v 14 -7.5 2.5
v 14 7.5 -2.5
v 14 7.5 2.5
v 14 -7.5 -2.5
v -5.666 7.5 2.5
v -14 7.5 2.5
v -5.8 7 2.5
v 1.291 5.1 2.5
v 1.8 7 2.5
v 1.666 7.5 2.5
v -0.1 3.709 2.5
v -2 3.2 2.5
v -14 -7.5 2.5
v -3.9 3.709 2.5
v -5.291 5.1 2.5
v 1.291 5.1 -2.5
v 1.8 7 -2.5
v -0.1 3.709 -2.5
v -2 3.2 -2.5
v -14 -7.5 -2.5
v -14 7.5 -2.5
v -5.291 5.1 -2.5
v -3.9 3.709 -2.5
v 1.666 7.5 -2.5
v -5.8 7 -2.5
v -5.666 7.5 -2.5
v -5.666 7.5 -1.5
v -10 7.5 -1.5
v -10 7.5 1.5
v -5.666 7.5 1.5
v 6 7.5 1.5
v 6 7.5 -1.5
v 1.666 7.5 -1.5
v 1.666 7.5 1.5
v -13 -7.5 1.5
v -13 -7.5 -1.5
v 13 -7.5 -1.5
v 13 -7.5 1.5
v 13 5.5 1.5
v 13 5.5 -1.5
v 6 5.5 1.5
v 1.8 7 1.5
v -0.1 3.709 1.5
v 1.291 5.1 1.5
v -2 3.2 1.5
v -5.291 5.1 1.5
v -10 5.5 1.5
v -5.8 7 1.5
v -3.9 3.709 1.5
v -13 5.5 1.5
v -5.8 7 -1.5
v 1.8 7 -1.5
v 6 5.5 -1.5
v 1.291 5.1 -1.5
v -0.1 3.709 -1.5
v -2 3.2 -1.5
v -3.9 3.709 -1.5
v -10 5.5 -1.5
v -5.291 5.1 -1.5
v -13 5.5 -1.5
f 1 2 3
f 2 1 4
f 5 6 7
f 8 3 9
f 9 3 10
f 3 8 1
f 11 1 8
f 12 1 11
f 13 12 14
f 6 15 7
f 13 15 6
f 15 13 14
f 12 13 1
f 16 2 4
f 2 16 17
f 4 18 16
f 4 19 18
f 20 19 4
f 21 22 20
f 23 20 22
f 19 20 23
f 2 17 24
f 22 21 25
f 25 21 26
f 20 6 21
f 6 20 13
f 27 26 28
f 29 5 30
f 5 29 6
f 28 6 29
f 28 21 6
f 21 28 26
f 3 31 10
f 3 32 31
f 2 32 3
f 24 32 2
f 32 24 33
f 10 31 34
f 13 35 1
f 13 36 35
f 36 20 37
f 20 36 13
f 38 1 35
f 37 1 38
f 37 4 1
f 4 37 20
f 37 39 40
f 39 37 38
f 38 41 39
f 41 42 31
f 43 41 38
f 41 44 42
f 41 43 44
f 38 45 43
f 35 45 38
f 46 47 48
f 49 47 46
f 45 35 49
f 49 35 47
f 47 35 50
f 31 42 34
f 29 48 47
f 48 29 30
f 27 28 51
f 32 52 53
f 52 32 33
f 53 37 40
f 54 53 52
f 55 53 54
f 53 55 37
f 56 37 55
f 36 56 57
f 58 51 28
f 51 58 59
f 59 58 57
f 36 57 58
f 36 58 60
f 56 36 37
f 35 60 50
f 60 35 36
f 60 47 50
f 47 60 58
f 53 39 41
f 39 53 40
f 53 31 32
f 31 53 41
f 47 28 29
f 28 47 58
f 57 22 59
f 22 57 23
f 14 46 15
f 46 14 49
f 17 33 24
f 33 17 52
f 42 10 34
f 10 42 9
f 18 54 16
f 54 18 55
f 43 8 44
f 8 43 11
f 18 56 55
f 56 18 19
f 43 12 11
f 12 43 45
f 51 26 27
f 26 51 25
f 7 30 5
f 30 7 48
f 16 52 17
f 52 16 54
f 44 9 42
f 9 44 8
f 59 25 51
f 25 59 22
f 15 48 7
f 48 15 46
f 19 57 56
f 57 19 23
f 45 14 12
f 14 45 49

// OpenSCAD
//difference(){
WIDTH=26;
difference(){
	color("green")cube([WIDTH+2,15,5], center=true);
   translate([0,-6,0])
	cube([WIDTH,23,3], center=true);
   translate([-2,0,0])
   cube([16,23,3], center=true);
   translate([-2,7,0])
   //cube([9,10,5], center=true);
    cylinder(r=3.8,h=10,center=true);
}
//translate([0,0,50]);
//cube([100,100,100], center=true);}
